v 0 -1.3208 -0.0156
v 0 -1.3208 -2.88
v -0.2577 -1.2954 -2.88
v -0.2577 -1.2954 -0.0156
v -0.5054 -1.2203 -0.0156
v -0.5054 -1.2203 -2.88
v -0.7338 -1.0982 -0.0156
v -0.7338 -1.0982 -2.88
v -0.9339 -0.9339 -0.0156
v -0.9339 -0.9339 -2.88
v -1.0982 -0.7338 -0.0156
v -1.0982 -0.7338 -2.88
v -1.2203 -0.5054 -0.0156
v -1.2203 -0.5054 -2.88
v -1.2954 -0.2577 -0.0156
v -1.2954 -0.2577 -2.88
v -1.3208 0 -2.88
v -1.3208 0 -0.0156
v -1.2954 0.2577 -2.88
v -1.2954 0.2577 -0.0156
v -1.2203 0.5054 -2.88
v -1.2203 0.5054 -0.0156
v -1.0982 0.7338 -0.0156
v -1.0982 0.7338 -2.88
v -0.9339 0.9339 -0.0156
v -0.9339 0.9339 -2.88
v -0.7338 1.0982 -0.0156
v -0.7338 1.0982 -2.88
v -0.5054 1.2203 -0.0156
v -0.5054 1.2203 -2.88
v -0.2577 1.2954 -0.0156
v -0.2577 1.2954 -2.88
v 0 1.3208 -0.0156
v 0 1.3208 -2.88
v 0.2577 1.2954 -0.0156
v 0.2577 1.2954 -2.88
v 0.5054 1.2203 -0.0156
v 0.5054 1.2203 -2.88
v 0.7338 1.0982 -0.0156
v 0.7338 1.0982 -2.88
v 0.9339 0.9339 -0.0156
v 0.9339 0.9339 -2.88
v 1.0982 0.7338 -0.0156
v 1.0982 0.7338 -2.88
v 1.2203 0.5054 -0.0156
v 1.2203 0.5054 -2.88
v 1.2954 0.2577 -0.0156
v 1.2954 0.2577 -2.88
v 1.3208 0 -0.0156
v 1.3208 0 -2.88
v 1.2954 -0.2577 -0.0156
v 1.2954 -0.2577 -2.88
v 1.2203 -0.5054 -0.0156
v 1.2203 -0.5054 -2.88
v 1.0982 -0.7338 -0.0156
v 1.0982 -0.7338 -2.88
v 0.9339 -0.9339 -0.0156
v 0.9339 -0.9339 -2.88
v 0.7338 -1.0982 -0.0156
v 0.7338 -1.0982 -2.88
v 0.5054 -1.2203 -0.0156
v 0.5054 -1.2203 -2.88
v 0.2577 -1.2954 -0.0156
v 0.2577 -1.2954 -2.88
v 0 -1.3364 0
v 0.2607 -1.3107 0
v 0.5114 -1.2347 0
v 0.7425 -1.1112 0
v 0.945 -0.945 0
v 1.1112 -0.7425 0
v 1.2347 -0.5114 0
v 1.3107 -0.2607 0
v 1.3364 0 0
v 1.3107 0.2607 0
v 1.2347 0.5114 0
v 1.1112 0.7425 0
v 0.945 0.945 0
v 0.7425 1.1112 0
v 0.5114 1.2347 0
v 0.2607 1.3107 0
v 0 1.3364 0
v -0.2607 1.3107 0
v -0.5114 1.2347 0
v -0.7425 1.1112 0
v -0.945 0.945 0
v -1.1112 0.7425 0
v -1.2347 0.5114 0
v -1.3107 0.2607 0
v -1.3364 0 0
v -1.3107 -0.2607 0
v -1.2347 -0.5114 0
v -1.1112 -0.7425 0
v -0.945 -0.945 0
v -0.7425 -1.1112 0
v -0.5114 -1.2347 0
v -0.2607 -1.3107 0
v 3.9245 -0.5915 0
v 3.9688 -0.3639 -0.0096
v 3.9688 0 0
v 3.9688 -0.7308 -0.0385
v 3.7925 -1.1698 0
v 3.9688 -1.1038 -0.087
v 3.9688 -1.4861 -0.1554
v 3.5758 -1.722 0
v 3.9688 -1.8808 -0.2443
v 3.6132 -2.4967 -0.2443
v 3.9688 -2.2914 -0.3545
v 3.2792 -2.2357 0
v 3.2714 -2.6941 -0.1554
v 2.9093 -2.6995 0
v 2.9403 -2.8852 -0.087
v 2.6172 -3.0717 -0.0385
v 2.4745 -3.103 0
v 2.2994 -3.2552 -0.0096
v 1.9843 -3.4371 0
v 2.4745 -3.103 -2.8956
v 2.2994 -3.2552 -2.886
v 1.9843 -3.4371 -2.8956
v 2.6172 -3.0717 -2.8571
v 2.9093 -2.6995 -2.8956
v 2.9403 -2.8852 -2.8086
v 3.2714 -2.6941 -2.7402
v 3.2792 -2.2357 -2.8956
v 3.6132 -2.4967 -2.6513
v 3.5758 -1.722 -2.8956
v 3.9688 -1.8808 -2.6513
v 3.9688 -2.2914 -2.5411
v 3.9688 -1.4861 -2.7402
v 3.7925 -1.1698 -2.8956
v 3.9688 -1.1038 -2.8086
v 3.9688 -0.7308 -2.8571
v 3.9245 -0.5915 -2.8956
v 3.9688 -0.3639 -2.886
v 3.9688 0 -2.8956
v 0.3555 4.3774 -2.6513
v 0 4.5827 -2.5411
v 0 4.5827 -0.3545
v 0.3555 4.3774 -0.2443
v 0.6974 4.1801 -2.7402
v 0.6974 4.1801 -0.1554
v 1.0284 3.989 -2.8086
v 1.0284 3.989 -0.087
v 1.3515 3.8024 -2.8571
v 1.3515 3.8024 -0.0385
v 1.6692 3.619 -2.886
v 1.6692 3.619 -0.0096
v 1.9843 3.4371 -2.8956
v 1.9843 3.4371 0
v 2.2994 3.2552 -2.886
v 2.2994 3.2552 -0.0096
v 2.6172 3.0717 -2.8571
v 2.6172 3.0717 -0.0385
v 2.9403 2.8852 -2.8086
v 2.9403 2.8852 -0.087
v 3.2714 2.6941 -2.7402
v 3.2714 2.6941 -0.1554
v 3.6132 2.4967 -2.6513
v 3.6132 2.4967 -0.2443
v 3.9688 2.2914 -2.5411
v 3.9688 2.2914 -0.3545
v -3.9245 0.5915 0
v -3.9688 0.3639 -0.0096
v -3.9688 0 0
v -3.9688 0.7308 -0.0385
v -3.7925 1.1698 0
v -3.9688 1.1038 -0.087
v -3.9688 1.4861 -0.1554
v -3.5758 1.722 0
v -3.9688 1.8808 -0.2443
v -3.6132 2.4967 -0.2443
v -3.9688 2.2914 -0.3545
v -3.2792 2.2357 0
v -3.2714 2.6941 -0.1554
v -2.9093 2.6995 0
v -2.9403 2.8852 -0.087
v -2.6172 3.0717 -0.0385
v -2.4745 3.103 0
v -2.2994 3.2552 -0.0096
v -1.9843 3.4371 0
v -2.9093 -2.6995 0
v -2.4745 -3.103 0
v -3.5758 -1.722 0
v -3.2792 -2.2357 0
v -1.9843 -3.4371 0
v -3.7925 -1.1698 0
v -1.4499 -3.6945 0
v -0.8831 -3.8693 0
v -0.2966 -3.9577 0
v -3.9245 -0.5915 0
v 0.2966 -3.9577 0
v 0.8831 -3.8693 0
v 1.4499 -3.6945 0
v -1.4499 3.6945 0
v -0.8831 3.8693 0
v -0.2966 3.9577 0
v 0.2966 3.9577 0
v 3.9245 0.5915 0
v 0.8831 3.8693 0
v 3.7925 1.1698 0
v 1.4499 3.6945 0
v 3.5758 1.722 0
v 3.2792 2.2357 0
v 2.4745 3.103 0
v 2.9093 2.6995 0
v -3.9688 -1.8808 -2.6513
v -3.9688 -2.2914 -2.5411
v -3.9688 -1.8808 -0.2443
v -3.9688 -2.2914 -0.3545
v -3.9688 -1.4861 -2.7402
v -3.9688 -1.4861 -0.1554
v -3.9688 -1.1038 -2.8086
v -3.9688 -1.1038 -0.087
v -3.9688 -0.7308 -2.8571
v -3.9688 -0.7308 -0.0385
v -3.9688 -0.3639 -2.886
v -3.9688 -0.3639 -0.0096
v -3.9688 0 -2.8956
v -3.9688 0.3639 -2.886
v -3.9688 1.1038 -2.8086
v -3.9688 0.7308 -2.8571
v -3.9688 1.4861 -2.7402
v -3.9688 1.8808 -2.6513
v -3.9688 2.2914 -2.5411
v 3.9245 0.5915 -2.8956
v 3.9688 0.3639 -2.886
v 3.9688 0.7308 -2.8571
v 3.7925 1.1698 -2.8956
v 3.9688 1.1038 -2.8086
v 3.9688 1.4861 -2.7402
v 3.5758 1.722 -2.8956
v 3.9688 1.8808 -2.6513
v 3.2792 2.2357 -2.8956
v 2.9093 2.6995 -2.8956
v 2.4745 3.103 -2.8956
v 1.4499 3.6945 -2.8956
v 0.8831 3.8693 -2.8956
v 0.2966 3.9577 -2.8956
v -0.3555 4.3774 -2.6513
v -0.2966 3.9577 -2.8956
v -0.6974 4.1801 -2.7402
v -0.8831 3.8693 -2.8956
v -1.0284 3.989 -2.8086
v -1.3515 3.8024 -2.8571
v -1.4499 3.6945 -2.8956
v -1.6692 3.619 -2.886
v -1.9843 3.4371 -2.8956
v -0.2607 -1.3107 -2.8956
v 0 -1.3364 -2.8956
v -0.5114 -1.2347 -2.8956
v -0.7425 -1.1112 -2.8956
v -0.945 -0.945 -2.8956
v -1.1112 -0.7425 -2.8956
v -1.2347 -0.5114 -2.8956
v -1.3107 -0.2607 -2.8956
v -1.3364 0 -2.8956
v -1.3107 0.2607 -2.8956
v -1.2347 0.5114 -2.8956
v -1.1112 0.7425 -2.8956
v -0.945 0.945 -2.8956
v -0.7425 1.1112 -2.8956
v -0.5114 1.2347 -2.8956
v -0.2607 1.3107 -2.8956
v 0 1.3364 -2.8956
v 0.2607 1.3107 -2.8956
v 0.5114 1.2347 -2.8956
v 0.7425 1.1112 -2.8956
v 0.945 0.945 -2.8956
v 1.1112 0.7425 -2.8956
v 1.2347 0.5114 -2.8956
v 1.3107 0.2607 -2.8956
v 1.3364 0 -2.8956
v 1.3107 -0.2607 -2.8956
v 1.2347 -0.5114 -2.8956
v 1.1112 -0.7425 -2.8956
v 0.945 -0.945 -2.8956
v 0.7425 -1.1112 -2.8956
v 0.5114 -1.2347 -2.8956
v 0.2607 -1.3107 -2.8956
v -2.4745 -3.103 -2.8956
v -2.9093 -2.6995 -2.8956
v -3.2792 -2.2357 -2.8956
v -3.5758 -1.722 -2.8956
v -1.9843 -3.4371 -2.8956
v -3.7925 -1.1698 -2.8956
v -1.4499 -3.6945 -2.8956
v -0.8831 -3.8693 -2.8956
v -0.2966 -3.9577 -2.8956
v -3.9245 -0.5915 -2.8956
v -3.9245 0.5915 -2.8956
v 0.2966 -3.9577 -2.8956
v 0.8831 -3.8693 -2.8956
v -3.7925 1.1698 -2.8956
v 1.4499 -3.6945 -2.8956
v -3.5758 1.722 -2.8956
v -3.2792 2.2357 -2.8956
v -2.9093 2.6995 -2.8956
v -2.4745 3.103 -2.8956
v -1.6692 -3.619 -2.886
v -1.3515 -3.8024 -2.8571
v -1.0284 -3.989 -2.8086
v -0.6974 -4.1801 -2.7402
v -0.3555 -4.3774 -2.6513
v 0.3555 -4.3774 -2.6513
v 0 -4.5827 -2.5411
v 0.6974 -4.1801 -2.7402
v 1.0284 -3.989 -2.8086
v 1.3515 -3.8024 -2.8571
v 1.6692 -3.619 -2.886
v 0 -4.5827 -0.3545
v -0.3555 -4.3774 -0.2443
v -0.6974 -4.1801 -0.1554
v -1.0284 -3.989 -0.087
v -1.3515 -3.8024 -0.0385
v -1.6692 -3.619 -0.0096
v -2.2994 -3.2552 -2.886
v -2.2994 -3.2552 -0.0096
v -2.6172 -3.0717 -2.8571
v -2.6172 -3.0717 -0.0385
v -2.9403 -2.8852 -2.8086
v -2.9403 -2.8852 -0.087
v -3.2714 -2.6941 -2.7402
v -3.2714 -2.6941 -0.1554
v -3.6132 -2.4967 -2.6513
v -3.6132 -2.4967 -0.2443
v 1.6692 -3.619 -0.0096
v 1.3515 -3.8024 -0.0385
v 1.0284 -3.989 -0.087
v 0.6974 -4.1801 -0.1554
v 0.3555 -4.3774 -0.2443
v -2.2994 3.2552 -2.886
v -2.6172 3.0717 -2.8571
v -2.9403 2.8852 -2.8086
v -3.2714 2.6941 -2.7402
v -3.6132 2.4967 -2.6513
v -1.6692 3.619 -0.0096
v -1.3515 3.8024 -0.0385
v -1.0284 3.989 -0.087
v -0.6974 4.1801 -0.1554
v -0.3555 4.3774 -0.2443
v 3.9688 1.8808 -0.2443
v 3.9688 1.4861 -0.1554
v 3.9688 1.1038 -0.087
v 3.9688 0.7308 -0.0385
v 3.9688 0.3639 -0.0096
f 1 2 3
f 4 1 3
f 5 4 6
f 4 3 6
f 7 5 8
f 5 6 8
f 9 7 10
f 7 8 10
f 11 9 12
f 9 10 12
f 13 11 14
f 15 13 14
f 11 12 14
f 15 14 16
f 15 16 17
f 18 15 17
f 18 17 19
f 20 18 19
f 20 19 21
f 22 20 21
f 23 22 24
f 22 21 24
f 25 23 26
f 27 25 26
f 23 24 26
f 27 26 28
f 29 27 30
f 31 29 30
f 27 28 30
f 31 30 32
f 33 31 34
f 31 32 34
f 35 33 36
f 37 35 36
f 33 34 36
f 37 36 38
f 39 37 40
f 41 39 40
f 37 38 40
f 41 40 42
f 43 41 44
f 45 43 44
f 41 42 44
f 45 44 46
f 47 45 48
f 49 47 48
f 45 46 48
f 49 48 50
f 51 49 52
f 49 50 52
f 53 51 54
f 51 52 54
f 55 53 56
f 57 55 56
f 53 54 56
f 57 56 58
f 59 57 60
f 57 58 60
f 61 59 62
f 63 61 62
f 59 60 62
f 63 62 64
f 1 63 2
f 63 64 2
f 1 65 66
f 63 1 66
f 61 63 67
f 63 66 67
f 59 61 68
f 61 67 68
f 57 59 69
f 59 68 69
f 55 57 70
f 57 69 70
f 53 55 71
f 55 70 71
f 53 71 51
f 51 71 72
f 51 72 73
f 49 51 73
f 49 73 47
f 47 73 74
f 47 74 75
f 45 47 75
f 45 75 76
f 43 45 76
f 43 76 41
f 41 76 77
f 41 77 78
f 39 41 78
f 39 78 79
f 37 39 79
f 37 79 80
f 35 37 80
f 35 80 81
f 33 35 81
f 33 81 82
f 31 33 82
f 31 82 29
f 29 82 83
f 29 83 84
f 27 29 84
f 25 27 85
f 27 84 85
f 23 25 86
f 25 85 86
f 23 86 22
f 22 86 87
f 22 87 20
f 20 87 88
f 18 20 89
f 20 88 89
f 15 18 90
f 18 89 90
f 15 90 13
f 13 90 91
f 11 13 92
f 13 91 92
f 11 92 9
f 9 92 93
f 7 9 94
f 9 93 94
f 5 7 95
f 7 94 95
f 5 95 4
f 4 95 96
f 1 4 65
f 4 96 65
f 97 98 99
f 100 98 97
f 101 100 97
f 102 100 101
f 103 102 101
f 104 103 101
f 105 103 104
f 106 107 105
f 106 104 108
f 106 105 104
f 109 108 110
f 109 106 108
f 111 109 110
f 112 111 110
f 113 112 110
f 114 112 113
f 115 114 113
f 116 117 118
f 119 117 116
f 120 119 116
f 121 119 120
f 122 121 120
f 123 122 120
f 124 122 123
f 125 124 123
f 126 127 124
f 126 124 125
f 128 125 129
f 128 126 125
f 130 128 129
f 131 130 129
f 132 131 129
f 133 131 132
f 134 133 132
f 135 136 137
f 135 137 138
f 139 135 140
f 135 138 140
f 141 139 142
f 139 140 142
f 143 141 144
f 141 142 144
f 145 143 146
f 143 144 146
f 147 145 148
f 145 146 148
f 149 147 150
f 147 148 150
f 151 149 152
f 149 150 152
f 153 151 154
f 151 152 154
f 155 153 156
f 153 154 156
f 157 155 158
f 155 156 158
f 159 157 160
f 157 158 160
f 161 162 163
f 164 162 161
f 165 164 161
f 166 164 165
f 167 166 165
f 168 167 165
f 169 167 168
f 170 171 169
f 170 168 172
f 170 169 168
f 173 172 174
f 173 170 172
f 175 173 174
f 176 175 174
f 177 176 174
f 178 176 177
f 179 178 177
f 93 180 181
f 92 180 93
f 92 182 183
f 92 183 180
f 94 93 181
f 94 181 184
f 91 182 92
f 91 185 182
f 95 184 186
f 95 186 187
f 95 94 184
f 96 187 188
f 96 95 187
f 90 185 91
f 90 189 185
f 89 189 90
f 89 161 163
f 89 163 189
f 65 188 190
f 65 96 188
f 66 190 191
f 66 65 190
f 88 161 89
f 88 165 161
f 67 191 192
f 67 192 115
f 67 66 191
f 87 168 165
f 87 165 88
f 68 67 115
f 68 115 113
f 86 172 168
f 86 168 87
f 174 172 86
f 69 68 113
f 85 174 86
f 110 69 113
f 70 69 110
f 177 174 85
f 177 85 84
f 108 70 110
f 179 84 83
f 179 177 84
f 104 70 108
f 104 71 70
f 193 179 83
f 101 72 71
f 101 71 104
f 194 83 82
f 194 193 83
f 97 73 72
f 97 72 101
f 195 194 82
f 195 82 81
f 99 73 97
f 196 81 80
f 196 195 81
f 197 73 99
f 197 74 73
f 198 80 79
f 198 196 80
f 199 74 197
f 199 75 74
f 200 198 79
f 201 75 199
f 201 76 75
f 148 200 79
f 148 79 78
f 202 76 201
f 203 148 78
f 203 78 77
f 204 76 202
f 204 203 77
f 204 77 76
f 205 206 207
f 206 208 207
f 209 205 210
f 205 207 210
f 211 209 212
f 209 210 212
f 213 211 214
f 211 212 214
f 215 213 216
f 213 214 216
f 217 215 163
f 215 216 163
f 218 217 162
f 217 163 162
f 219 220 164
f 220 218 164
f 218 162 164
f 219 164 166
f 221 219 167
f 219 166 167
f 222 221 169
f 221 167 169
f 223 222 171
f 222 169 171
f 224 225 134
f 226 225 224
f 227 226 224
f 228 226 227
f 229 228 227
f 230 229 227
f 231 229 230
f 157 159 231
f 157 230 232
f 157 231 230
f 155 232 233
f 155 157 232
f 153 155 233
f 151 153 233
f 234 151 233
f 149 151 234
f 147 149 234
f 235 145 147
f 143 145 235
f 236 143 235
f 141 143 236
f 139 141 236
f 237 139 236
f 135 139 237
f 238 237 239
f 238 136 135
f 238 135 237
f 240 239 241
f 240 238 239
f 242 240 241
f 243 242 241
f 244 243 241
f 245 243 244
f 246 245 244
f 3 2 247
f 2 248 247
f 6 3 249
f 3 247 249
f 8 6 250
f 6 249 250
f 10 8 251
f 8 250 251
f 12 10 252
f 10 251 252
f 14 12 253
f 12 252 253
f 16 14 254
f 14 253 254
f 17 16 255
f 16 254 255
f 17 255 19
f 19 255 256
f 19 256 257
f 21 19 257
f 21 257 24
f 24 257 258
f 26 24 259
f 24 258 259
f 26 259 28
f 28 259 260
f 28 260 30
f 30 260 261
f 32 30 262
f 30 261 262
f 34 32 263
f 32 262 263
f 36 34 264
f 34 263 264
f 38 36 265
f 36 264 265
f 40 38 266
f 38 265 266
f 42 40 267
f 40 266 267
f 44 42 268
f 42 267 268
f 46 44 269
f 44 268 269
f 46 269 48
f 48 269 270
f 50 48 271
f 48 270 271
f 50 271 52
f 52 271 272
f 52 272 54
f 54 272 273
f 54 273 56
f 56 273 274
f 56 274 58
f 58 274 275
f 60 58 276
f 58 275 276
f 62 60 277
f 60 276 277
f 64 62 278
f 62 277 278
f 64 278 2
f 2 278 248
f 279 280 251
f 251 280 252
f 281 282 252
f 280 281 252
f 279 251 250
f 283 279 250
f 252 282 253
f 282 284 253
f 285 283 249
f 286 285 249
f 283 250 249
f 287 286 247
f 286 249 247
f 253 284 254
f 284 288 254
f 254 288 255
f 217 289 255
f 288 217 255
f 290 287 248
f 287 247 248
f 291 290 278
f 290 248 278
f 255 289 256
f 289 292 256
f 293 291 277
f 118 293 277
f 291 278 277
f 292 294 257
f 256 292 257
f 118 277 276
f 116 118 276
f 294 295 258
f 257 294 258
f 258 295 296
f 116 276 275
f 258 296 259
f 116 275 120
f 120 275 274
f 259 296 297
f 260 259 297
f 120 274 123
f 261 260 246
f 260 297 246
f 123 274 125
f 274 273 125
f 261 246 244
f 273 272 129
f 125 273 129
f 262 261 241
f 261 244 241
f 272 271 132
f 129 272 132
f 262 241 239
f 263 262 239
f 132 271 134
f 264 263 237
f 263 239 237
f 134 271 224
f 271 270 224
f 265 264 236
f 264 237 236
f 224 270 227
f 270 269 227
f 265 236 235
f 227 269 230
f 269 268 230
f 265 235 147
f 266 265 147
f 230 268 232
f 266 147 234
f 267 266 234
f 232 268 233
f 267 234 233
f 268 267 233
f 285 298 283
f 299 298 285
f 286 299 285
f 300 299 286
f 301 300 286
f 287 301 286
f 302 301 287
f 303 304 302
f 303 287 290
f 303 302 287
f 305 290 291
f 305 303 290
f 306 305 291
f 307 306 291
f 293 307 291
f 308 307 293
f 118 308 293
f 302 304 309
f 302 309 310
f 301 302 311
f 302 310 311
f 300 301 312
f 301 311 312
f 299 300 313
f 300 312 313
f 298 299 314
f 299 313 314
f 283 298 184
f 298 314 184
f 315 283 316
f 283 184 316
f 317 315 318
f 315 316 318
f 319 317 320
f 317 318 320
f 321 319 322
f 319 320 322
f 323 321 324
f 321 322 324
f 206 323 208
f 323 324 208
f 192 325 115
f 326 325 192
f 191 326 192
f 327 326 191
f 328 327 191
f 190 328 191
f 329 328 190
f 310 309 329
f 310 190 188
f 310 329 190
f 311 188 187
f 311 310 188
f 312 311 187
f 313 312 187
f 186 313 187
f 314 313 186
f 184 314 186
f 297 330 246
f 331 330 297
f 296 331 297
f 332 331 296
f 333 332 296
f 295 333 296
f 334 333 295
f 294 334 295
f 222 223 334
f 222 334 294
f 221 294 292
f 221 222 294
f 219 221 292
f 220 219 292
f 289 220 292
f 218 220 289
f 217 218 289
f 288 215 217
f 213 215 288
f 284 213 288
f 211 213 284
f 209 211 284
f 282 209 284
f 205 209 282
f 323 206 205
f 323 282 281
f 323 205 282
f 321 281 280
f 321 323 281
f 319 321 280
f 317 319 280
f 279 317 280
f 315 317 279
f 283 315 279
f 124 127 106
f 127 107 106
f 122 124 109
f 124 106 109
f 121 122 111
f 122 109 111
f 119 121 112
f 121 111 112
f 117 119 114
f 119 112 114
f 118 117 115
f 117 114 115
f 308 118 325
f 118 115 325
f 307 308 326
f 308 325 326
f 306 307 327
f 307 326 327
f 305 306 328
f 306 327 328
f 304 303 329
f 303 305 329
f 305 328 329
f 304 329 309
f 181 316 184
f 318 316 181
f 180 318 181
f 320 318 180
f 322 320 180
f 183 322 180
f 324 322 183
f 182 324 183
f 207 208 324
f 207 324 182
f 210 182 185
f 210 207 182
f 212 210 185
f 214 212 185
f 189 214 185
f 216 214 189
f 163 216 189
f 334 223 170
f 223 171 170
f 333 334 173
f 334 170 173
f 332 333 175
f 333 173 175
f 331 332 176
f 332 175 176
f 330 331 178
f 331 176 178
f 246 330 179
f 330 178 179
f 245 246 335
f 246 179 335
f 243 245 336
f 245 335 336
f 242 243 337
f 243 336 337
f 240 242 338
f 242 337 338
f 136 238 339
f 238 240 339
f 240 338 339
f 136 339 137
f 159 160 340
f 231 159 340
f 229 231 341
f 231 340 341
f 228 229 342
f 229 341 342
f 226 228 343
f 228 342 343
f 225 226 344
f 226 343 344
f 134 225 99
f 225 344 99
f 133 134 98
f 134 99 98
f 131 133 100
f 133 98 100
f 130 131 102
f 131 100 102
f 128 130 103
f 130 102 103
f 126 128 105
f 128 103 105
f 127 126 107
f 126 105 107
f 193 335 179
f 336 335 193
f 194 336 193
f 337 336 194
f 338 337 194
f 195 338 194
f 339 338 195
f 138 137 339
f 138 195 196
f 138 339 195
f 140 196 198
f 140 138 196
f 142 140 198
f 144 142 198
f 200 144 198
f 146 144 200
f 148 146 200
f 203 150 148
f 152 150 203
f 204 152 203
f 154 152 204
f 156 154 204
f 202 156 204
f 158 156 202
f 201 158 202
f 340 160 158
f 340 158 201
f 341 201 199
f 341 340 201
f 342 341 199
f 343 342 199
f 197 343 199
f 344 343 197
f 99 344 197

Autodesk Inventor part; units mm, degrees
ref_plane "YZ Plane" through (0, 0, 0) normal (1, 0, 0) x (0, 1, 0)
sketch "Sketch7" plane through (0, 0, 0) normal (0, 0, 1) x (1, 0, 0)
  circle A0 centre (0, 0) radius 3.9688 construction
  line L0 (-3.9688, -2.2914) -> (-3.9688, 2.2914)
  line L1 (-3.9688, 2.2914) -> (0, 4.5827)
  line L2 (0, 4.5827) -> (3.9688, 2.2914)
  line L3 (3.9688, 2.2914) -> (3.9688, -2.2914)
  line L4 (3.9688, -2.2914) -> (0, -4.5827)
  line L5 (0, -4.5827) -> (-3.9688, -2.2914)
  dimension "d40" = 7.9375
extrude "Extrusion1" add sketch "Sketch7" against normal blind 2.8956
sketch "Sketch11" plane through (0, 0, 0) normal (0, 0, 1) x (1, 0, 0)
  line L0 (0, 4.5827) -> (3.9688, 2.2914) projected
  line L1 (-3.9688, 2.2914) -> (0, 4.5827) projected
  line L2 (-3.9688, 2.2914) -> (3.9688, -2.2914) construction
  line L3 (-3.9688, -2.2914) -> (3.9688, 2.2914) construction
  point P0 (0, 0)
hole "Hole1" at (0, 0, 0) direction (0, 0, -1) diameter 2.6416 end through all thread size "6-32 UNC" class "2B" standard "ANSI Unified Screw Threads"
chamfer "Chamfer1" distance 0.0156 angle 45 2 edges at (0, 1.3208, 0) (0, 1.3208, -2.8956)
sketch "Sketch9" plane through (0, 0, 0) normal (1, 0, 0) x (0, 1, 0)
  line L0 (-4.5827, -2.5411) -> (-4.5827, -2.8956)
  line L1 (-4.5827, -2.8956) -> (-3.9688, -2.8956)
  line L2 (-3.9688, -2.8956) -> (-4.5827, -2.5411)
  line L3 (0, -2.9665) -> (0, -2.4702) projected
  line L4 (-4.5827, -2.8956) -> (-2.2914, -2.8956) projected
  dimension "d38" = 7.9375
  dimension "d41" = 150
revolve "Revolution1" cut sketch "Sketch9" angle 360 about axis through (0, 0, -10) along (0, 0, 1)
sketch "Sketch10" plane through (0, 0, 0) normal (1, 0, 0) x (0, 1, 0)
  line L0 (-4.5827, -0.3545) -> (-4.5827, 0)
  line L1 (-4.5827, 0) -> (-3.9688, 0)
  line L2 (-3.9688, 0) -> (-4.5827, -0.3545)
  line L3 (0, -0.4254) -> (0, 0.0709) projected
  line L4 (-2.2914, 0) -> (-4.5827, 0) projected
  dimension "d45" = 7.9375
  dimension "d46" = 150
revolve "Revolution2" cut sketch "Sketch10" angle 360 about axis through (0, 0, -10) along (0, 0, 1)
ref_plane "MSC_PF1" through (0, 0, 0) normal (1, 0, 0) x (0, 1, 0)
ref_plane "MSC_PT1" through (0, 0, 0) normal (0, 0, 1) x (1, 0, 0)
equation "\"d38\" = Fbas"
equation "\"d40\" = Fbas"
equation "\"d29\" = Hbas"
equation "\"d63\" = 0.5 * PTC"
equation "\"d45\" = Fbas"
equation "\"Fbas\" = 7.9375"
equation "\"Hbas\" = 2.8956"
equation "\"NND\" = 3.5052"
equation "\"THREADDIA\" = NND"
equation "\"PTC\" = 0.03125"
properties part number "ASME B18.6.3 - 6-32" material "Steel, Mild"
